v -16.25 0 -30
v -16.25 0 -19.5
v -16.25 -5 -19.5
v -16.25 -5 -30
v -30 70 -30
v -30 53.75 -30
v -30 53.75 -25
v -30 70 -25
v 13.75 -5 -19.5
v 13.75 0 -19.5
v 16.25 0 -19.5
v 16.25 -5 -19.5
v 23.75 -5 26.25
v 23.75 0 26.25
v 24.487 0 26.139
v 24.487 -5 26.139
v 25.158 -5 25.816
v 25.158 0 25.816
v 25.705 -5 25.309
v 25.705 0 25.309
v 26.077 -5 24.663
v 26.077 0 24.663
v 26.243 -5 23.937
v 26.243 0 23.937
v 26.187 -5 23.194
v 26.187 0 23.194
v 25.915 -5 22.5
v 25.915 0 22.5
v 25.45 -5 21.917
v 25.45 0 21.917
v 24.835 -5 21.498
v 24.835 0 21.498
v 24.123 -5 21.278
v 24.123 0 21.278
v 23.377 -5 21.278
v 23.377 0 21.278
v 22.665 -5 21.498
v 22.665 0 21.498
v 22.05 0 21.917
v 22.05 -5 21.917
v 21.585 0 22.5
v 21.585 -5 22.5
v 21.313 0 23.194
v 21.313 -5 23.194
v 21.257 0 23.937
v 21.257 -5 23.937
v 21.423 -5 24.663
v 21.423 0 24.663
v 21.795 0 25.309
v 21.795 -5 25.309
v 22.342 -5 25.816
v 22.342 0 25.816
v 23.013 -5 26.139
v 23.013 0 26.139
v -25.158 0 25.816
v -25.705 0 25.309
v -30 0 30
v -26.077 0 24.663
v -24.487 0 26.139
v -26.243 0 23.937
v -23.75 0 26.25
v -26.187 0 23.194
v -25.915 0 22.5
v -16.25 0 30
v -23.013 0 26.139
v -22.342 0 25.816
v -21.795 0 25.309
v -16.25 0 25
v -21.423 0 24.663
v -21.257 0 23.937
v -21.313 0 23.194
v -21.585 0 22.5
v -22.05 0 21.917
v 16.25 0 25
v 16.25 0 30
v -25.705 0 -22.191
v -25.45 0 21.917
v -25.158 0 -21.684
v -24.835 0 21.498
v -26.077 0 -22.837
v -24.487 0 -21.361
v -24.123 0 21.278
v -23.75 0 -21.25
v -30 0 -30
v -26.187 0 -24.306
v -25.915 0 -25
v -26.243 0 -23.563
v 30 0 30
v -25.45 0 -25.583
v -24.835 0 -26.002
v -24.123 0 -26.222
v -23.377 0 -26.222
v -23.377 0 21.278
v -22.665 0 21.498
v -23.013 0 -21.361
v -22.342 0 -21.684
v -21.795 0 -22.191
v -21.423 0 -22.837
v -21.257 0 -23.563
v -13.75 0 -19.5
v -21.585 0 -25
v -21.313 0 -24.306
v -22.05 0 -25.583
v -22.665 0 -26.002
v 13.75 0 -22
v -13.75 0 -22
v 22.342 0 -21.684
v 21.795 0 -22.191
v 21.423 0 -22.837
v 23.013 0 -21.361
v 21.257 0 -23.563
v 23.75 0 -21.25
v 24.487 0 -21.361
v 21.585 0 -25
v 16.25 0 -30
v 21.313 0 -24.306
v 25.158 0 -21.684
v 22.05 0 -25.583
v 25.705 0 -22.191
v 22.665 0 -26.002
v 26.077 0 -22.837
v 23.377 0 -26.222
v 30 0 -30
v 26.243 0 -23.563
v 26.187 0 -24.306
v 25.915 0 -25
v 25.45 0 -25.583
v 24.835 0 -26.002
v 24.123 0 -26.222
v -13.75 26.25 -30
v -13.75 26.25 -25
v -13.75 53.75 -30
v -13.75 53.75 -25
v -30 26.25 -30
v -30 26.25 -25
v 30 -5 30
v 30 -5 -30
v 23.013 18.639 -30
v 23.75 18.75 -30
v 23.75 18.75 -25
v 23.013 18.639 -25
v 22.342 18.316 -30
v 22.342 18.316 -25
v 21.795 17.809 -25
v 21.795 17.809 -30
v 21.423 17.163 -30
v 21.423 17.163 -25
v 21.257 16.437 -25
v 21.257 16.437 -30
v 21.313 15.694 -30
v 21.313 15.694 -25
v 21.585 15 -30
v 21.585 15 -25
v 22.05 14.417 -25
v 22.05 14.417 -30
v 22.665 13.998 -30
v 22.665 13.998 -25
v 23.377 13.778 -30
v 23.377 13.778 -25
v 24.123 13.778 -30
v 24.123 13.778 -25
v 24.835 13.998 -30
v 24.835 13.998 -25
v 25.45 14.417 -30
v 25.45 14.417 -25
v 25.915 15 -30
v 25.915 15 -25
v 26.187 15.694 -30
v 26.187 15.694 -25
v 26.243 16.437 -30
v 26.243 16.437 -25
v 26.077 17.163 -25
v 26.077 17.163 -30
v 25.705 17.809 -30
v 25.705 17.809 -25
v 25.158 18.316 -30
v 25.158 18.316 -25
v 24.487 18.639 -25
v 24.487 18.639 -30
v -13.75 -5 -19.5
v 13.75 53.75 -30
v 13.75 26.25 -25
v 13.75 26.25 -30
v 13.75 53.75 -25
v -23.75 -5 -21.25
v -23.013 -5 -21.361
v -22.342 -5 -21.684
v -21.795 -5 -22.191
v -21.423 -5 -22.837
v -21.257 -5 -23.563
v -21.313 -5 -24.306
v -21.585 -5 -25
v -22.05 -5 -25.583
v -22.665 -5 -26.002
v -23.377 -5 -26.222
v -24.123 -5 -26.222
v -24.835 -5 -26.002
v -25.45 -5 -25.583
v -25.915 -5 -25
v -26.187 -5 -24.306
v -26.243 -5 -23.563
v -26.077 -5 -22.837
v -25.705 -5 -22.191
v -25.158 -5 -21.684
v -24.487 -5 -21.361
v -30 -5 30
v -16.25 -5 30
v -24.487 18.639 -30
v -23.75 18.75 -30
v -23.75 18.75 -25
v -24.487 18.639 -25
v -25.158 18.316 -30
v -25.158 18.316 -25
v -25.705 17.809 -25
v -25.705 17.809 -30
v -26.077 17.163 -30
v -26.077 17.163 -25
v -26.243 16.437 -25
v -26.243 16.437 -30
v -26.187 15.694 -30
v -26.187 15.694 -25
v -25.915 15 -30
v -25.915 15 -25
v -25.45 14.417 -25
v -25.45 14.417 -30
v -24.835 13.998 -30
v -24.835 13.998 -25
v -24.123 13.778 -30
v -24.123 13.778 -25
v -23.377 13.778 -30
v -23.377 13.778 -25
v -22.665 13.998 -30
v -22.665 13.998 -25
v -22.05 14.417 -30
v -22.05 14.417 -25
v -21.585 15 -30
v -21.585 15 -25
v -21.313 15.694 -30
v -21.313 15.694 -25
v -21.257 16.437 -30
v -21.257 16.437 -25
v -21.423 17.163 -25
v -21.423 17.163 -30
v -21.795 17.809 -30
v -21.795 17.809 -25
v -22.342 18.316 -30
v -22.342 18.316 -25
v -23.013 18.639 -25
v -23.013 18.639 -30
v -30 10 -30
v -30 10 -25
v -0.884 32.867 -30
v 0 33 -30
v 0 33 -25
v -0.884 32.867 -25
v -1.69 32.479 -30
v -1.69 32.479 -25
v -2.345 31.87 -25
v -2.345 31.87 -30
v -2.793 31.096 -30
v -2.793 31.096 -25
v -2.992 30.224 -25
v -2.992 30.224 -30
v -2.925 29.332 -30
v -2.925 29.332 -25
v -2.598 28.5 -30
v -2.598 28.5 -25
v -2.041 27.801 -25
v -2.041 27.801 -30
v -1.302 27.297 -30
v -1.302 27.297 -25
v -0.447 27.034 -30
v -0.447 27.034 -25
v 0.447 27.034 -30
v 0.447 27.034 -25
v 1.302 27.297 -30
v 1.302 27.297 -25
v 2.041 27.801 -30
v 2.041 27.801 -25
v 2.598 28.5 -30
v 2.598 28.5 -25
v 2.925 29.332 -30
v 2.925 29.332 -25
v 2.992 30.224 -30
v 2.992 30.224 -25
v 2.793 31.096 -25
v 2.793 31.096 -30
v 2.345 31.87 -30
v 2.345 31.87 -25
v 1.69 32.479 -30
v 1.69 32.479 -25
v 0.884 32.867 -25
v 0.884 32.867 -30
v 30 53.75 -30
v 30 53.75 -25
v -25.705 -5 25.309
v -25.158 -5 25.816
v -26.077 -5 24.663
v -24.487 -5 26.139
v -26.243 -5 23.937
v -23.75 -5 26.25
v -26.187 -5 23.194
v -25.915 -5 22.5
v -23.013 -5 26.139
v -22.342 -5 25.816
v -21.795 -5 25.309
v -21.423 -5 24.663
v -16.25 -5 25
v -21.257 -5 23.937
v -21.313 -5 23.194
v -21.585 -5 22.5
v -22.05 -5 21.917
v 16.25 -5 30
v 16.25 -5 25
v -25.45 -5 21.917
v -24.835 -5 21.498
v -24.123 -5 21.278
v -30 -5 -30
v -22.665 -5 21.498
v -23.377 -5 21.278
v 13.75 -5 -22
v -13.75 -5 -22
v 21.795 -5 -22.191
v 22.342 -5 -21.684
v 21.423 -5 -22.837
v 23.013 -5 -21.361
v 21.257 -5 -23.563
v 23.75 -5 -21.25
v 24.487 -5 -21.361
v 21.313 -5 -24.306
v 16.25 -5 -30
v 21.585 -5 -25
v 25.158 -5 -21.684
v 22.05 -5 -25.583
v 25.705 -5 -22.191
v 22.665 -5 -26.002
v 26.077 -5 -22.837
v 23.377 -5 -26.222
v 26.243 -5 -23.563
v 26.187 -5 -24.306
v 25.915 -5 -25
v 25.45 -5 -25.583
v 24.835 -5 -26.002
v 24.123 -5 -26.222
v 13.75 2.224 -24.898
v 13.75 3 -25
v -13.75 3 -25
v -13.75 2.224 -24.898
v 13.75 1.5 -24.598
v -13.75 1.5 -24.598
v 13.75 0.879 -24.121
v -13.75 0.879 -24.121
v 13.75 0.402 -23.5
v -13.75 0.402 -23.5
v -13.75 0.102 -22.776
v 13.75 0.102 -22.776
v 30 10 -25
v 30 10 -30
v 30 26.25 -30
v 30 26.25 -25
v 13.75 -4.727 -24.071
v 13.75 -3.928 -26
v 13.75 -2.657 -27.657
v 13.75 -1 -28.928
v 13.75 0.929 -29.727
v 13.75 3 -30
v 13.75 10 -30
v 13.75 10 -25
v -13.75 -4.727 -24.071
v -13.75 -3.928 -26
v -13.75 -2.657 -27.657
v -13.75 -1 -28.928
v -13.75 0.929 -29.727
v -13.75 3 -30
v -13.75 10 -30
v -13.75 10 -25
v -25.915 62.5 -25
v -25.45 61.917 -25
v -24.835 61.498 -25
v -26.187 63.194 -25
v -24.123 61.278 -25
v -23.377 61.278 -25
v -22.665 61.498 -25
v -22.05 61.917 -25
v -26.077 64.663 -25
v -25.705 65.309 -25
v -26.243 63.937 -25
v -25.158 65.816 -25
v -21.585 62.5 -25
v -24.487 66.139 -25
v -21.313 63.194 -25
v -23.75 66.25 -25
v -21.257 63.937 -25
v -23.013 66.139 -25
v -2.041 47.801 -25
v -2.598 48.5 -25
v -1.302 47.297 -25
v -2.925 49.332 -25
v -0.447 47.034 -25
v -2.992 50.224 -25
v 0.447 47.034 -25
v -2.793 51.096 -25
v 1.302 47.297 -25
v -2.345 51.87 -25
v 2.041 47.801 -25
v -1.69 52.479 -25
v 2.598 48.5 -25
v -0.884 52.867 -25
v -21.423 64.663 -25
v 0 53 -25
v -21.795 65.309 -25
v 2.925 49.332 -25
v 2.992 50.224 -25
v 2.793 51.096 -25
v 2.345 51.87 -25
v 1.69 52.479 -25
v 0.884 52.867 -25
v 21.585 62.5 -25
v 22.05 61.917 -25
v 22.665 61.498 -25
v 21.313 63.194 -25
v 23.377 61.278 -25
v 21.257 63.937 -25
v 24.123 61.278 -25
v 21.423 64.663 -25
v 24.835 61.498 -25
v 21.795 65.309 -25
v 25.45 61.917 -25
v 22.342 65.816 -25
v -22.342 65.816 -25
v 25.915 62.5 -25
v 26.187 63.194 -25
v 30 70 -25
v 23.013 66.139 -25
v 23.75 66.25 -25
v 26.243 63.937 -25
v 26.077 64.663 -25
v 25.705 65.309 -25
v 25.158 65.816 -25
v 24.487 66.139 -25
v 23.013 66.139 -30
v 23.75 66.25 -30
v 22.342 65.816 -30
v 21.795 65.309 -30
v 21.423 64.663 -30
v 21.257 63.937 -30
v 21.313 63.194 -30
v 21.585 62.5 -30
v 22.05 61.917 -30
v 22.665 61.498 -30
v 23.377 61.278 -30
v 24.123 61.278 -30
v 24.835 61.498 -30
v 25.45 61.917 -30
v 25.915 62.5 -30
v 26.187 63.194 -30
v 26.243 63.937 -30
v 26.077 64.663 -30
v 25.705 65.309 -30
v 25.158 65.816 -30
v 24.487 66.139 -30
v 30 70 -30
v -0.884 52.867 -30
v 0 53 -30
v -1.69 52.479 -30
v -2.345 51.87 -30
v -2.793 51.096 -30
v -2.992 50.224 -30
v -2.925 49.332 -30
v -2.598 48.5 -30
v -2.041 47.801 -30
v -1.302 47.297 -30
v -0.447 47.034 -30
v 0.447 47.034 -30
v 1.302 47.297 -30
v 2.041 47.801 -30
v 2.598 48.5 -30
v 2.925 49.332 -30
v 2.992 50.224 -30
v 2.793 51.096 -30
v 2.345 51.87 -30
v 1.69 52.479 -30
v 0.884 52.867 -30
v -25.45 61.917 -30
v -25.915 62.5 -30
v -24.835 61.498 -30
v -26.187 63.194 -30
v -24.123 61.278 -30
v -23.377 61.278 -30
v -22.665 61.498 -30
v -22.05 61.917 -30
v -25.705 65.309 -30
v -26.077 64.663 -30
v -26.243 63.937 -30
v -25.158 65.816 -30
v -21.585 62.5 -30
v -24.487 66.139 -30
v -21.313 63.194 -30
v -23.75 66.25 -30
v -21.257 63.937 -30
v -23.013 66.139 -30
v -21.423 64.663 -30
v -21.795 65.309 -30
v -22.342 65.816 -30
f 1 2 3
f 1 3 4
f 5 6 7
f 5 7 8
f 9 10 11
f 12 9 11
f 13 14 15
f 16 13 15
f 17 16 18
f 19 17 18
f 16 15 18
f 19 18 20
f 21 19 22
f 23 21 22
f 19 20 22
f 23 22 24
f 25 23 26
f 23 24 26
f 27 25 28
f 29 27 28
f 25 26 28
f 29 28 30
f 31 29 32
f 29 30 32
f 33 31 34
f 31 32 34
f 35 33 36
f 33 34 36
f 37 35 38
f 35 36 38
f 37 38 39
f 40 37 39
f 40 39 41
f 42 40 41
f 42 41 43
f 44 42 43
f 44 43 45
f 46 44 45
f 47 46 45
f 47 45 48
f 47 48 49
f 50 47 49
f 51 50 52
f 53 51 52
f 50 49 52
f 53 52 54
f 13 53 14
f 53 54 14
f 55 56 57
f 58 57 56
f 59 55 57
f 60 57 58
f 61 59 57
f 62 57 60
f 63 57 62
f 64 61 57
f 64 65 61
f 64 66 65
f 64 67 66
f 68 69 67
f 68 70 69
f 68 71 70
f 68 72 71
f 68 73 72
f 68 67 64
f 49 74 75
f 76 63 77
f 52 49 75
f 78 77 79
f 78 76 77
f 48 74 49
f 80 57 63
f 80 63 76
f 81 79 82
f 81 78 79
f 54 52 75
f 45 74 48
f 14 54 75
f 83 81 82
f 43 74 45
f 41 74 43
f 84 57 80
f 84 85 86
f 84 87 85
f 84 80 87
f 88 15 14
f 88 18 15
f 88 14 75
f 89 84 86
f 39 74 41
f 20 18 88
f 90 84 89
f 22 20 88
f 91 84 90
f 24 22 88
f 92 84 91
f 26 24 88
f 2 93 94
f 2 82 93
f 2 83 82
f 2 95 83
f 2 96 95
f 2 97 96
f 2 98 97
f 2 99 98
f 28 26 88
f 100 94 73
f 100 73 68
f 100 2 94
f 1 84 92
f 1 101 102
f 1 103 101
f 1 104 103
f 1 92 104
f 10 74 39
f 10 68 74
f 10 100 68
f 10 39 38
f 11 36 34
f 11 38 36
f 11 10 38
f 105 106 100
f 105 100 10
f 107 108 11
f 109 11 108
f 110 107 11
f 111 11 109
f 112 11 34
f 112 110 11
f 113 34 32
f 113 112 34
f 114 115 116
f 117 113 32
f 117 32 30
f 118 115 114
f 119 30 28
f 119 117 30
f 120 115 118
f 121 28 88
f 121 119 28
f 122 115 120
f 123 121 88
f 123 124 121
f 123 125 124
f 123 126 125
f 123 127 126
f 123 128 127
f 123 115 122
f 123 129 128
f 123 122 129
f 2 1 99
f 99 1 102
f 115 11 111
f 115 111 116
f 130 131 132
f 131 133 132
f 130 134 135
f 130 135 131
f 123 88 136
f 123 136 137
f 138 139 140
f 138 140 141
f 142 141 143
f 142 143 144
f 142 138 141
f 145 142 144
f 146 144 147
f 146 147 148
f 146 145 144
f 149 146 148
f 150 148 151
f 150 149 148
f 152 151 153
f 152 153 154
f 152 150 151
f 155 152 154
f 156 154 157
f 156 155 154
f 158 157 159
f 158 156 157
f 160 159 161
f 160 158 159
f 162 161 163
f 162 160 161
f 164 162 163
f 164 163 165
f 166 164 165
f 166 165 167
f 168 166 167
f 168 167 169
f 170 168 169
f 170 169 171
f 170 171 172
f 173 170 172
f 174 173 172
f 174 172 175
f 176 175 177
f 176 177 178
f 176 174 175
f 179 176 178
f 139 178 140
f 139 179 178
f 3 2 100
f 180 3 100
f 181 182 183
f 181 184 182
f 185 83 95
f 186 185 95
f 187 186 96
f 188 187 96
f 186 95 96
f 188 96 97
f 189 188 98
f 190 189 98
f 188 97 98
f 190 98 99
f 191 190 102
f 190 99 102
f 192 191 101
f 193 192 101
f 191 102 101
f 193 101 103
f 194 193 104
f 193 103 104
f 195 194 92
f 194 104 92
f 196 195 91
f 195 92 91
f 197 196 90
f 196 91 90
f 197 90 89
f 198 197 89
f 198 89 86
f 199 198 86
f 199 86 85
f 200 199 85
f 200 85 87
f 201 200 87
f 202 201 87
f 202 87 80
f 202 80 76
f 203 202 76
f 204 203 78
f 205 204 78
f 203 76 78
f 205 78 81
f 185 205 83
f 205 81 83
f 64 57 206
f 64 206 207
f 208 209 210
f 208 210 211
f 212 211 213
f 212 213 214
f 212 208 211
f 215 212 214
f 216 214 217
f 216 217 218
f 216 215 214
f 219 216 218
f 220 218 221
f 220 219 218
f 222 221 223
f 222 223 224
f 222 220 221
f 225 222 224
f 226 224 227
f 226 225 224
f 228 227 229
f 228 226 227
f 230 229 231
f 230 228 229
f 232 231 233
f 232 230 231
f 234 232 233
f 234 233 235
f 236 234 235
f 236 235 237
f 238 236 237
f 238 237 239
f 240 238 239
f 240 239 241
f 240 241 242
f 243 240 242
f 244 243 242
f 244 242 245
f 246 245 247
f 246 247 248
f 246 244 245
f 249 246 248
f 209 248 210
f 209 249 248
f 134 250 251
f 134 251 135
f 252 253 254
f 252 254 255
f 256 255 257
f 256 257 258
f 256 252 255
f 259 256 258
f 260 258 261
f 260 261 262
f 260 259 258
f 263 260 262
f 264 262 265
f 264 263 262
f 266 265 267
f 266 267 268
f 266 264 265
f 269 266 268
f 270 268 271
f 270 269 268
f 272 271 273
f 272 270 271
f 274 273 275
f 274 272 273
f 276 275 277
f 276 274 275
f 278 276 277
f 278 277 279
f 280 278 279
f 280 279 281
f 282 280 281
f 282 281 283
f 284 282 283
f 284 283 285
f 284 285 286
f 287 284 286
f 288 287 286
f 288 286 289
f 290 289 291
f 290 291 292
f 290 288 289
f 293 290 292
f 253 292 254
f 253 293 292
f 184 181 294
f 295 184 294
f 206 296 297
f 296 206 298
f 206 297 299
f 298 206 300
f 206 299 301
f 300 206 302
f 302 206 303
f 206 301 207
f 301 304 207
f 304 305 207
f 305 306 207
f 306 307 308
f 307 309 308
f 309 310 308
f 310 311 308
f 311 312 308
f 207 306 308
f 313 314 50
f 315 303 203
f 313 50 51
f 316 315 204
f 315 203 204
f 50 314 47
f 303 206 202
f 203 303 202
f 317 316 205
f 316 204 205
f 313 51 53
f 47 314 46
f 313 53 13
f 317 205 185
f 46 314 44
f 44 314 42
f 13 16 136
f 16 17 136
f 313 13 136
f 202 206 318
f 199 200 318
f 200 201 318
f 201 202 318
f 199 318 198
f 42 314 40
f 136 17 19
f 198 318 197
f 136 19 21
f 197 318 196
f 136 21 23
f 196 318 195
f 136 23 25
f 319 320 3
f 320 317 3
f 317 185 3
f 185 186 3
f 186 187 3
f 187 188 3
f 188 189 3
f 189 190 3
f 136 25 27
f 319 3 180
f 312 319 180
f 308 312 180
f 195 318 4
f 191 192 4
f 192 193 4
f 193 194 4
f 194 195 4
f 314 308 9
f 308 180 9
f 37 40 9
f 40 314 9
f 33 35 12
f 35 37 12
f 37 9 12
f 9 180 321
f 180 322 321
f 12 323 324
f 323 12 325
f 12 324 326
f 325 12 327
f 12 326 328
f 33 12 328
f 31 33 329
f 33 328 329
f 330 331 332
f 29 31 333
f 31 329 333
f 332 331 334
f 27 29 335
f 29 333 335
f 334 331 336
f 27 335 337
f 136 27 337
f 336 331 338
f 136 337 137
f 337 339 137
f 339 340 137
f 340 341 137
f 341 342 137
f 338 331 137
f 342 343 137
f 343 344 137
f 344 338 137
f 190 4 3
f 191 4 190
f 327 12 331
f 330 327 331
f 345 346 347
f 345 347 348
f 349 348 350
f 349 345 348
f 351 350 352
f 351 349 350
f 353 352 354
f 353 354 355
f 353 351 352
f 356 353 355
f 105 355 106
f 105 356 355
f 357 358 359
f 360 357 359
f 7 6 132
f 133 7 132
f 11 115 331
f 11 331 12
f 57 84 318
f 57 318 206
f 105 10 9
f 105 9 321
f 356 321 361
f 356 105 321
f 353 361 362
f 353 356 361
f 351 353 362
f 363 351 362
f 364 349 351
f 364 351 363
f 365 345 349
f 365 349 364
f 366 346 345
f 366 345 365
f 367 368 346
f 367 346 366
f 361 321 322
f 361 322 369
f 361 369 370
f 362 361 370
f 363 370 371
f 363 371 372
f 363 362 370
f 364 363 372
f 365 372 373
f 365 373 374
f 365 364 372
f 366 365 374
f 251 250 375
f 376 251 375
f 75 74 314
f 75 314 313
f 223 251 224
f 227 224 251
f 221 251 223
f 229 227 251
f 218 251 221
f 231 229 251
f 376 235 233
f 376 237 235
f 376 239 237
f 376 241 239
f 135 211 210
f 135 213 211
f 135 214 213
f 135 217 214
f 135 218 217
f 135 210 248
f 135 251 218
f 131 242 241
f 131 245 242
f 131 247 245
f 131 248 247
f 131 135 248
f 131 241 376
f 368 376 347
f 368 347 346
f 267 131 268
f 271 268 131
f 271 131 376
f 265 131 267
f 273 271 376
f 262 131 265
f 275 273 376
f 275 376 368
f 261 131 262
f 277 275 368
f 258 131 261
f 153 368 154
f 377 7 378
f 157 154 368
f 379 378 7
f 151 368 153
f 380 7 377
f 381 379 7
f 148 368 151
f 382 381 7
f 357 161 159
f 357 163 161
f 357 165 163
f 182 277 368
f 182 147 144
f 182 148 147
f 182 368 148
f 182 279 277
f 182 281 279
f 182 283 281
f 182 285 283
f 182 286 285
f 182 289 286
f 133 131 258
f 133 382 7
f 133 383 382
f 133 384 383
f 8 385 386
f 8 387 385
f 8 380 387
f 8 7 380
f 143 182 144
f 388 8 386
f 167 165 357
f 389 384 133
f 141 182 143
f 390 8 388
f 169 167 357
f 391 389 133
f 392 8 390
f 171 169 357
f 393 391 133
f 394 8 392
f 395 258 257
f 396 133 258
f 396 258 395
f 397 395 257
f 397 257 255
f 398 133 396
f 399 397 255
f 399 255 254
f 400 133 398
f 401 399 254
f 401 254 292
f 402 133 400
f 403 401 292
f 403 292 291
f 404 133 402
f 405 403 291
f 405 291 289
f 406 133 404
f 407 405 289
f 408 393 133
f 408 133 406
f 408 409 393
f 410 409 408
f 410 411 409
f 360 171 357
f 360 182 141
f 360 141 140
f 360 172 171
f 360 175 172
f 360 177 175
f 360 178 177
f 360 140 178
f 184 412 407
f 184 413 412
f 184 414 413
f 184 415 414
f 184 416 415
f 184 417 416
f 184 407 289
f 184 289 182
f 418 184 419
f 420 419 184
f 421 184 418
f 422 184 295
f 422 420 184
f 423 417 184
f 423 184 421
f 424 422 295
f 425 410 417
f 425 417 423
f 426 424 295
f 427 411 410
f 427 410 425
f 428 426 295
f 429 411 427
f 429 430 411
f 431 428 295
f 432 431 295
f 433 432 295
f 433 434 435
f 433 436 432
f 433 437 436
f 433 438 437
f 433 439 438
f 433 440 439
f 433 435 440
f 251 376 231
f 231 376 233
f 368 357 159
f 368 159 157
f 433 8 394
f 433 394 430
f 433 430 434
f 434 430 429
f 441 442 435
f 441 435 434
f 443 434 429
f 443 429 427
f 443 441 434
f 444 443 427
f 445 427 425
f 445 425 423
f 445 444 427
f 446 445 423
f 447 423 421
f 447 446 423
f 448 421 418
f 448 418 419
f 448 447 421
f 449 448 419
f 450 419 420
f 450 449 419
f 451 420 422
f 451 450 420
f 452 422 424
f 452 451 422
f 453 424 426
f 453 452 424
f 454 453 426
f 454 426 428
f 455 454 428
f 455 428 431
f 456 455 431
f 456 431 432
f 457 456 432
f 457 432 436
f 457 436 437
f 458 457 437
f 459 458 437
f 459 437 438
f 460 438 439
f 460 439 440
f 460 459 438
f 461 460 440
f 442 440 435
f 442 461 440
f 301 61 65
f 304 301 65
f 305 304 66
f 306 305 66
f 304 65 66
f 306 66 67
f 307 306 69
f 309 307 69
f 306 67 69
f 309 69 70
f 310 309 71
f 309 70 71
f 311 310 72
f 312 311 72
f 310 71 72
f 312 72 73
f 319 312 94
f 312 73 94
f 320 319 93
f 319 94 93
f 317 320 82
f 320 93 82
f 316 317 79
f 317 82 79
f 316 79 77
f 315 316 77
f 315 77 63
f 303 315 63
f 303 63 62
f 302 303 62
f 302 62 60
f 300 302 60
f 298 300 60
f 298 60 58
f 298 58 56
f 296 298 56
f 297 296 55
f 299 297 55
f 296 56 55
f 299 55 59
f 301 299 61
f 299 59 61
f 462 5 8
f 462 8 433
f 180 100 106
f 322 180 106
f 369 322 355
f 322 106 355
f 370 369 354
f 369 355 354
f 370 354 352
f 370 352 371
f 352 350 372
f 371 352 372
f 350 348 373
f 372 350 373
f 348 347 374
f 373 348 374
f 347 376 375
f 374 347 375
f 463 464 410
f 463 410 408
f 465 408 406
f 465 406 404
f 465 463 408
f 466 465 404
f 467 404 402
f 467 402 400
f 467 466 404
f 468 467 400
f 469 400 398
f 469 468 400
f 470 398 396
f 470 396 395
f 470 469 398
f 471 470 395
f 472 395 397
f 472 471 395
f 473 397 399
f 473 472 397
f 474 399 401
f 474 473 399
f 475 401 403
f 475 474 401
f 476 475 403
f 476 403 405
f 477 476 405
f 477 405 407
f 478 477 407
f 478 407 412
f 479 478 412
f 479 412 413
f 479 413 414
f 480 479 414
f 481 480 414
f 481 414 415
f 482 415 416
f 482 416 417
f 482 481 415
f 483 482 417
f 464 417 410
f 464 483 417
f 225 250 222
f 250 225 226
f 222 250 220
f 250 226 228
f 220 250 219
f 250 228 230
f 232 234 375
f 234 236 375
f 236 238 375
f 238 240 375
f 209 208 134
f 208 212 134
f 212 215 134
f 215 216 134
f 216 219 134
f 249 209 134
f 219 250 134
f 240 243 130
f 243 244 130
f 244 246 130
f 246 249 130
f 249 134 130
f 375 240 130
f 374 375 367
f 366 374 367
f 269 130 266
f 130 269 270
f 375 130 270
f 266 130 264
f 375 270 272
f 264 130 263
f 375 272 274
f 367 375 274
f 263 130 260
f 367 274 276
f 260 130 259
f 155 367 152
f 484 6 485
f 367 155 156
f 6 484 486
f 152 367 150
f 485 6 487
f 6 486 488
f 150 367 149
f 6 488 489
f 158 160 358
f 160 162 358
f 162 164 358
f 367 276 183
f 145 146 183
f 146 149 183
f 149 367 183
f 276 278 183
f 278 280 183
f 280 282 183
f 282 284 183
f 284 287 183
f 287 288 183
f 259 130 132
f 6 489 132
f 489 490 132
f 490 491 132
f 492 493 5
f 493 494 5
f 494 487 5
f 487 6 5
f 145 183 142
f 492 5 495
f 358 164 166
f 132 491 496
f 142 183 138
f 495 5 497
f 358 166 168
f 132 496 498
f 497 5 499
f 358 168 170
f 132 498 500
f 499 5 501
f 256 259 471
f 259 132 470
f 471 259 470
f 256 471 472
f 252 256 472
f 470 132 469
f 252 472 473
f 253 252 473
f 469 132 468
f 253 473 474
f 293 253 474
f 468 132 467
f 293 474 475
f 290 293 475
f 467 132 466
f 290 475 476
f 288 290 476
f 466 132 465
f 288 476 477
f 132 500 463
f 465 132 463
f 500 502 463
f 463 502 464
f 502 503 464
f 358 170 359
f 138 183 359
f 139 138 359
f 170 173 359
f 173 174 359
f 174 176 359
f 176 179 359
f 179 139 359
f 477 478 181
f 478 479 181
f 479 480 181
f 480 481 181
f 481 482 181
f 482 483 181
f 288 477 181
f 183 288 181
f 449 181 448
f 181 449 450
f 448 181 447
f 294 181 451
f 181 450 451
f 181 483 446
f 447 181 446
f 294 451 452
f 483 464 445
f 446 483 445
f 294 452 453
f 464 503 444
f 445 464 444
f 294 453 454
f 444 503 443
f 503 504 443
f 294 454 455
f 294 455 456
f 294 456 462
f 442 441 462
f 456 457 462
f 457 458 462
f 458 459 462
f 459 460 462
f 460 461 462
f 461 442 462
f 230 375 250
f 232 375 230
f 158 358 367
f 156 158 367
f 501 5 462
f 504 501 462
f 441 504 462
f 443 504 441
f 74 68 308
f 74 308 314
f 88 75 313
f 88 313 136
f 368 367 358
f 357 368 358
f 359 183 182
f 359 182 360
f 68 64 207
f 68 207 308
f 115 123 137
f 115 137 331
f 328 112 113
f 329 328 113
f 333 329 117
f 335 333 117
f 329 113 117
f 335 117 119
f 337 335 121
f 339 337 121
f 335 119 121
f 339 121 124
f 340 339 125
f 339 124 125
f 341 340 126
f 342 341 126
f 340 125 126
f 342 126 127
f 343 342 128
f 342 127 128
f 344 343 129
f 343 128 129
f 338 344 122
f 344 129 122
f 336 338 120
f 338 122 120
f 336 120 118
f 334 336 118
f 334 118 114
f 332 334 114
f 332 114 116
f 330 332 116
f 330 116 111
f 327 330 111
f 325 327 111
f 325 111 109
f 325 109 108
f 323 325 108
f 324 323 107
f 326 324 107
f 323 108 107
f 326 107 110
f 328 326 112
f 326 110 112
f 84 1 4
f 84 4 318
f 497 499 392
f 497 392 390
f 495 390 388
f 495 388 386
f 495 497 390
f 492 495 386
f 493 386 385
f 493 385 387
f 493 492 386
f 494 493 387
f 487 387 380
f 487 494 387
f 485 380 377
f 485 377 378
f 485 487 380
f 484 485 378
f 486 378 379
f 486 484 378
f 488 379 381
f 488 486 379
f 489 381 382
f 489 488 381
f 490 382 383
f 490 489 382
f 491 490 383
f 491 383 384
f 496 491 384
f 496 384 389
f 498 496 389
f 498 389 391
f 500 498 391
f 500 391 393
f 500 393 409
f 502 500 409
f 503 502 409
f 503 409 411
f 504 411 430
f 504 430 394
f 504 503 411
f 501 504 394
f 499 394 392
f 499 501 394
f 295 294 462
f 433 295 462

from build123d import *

# Parameters (mm, degrees)
SKETCH_1_R                        = 2.5
SM_BASE_FLANGE_1_DEPTH            = 5
SM_EDGE_FLANGE_1_STRIP_W          = 26
SM_EDGE_FLANGE_1_STRIP_H          = 5
SM_EDGE_FLANGE_1_STRIP_CUT_DEPTH  = 27.5
SM_EDGE_FLANGE_1_RELIEF_W         = 28.5
SM_EDGE_FLANGE_1_RELIEF_H         = 2.5
SM_EDGE_FLANGE_1_RELIEF_CUT_DEPTH = 5
SM_EDGE_FLANGE_1_DEPTH            = 27.5
EXTRUDE_START                     = -30
SKETCH_9_W                        = 16.25
SKETCH_9_H                        = 16.25
EXTRUDE_1_DEPTH                   = 5
CUT_EXTRUDE_START                 = -30
SKETCH_10_R                       = 3
CUT_EXTRUDE_1_DEPTH               = 5
SKETCH_11_R                       = 2.5
CUT_EXTRUDE_2_DEPTH               = 5


# Sheet-metal steps are written as plain solids
with BuildPart() as part:
    # Sketch 1 → 基体-法兰1 (new body)
    with BuildSketch(Plane(origin=(0, 0, 0), x_dir=(1, 0, 0), z_dir=(0, 1, 0))):
        Polygon((-16.25, 25), (-16.25, 30), (-30, 30), (-30, -30), (-16.25, -30), (-16.25, -25), (16.25, -25), (16.25, -30), (30, -30), (30, 30), (16.25, 30), (16.25, 25), align=None)
        with Locations(Location((-23.75, 23.75, 0), (0, 0, 270))):
            Circle(SKETCH_1_R, mode=Mode.SUBTRACT)
        with Locations(Location((23.75, 23.75, 0), (0, 0, 270))):
            Circle(SKETCH_1_R, mode=Mode.SUBTRACT)
        with Locations(Location((-23.75, -23.75, 0), (0, 0, 270))):
            Circle(SKETCH_1_R, mode=Mode.SUBTRACT)
        with Locations(Location((23.75, -23.75, 0), (0, 0, 270))):
            Circle(SKETCH_1_R, mode=Mode.SUBTRACT)
    extrude(amount=-SM_BASE_FLANGE_1_DEPTH)

    # 边线-法兰1 strip (across the edge) → 边线-法兰1 strip cut (cut)
    with BuildSketch(Plane(origin=(13.75, 0, -25), x_dir=(0, 0, 1), z_dir=(-1, 0, 0))):
        with Locations((-10, -2.5)):
            Rectangle(SM_EDGE_FLANGE_1_STRIP_W, SM_EDGE_FLANGE_1_STRIP_H)
    extrude(amount=SM_EDGE_FLANGE_1_STRIP_CUT_DEPTH, mode=Mode.SUBTRACT)

    # 边线-法兰1 relief (on the sheet) → 边线-法兰1 relief cut (cut)
    with BuildSketch(Plane(origin=(13.75, 0, -22), x_dir=(0, 0, 1), z_dir=(0, 1, 0))):
        with Locations((-11.75, 1.25)):
            Rectangle(SM_EDGE_FLANGE_1_RELIEF_W, SM_EDGE_FLANGE_1_RELIEF_H)
        with Locations((-11.75, -28.75)):
            Rectangle(SM_EDGE_FLANGE_1_RELIEF_W, SM_EDGE_FLANGE_1_RELIEF_H)
    extrude(amount=-SM_EDGE_FLANGE_1_RELIEF_CUT_DEPTH, mode=Mode.SUBTRACT)

    # 边线-法兰1 section (across the edge) → 边线-法兰1 (add)
    with BuildSketch(Plane(origin=(13.75, 0, -25), x_dir=(0, 0, 1), z_dir=(-1, 0, 0))):
        with BuildLine():
            Line((-5, 3), (-5, 70))
            Line((-5, 70), (0, 70))
            Line((0, 70), (0, 3))
            ThreePointArc((0, 3), (0.878679656, 0.878679656), (3, 0))
            Line((3, 0), (3, -5))
            ThreePointArc((3, -5), (-2.656854249, -2.656854249), (-5, 3))
        make_face()
    extrude(amount=SM_EDGE_FLANGE_1_DEPTH)

    # 草图9 → 凸台-拉伸1 (add)
    with BuildSketch(Plane.XY.offset(EXTRUDE_START)):
        with Locations((-21.875, 61.875)):
            Rectangle(SKETCH_9_W, SKETCH_9_H)
        with Locations((21.875, 61.875)):
            Rectangle(SKETCH_9_W, SKETCH_9_H)
        with Locations((-21.875, 18.125)):
            Rectangle(SKETCH_9_W, SKETCH_9_H)
        with Locations((21.875, 18.125)):
            Rectangle(SKETCH_9_W, SKETCH_9_H)
    extrude(amount=EXTRUDE_1_DEPTH)

    # 草图10 → 切除-拉伸1 (cut)
    with BuildSketch(Plane.XY.offset(CUT_EXTRUDE_START)):
        with Locations(Location((0, 50, 0), (0, 0, 90))):
            Circle(SKETCH_10_R)
        with Locations(Location((0, 30, 0), (0, 0, 90))):
            Circle(SKETCH_10_R)
    extrude(amount=CUT_EXTRUDE_1_DEPTH, mode=Mode.SUBTRACT)

    # 草图11 → 切除-拉伸2 (cut)
    with BuildSketch(Plane.XY.offset(CUT_EXTRUDE_START)):
        with Locations(Location((-23.75, 16.25, 0), (0, 0, 90))):
            Circle(SKETCH_11_R)
        with Locations(Location((-23.75, 63.75, 0), (0, 0, 90))):
            Circle(SKETCH_11_R)
        with Locations(Location((23.75, 63.75, 0), (0, 0, 90))):
            Circle(SKETCH_11_R)
        with Locations(Location((23.75, 16.25, 0), (0, 0, 90))):
            Circle(SKETCH_11_R)
    extrude(amount=CUT_EXTRUDE_2_DEPTH, mode=Mode.SUBTRACT)


solid = part.part
